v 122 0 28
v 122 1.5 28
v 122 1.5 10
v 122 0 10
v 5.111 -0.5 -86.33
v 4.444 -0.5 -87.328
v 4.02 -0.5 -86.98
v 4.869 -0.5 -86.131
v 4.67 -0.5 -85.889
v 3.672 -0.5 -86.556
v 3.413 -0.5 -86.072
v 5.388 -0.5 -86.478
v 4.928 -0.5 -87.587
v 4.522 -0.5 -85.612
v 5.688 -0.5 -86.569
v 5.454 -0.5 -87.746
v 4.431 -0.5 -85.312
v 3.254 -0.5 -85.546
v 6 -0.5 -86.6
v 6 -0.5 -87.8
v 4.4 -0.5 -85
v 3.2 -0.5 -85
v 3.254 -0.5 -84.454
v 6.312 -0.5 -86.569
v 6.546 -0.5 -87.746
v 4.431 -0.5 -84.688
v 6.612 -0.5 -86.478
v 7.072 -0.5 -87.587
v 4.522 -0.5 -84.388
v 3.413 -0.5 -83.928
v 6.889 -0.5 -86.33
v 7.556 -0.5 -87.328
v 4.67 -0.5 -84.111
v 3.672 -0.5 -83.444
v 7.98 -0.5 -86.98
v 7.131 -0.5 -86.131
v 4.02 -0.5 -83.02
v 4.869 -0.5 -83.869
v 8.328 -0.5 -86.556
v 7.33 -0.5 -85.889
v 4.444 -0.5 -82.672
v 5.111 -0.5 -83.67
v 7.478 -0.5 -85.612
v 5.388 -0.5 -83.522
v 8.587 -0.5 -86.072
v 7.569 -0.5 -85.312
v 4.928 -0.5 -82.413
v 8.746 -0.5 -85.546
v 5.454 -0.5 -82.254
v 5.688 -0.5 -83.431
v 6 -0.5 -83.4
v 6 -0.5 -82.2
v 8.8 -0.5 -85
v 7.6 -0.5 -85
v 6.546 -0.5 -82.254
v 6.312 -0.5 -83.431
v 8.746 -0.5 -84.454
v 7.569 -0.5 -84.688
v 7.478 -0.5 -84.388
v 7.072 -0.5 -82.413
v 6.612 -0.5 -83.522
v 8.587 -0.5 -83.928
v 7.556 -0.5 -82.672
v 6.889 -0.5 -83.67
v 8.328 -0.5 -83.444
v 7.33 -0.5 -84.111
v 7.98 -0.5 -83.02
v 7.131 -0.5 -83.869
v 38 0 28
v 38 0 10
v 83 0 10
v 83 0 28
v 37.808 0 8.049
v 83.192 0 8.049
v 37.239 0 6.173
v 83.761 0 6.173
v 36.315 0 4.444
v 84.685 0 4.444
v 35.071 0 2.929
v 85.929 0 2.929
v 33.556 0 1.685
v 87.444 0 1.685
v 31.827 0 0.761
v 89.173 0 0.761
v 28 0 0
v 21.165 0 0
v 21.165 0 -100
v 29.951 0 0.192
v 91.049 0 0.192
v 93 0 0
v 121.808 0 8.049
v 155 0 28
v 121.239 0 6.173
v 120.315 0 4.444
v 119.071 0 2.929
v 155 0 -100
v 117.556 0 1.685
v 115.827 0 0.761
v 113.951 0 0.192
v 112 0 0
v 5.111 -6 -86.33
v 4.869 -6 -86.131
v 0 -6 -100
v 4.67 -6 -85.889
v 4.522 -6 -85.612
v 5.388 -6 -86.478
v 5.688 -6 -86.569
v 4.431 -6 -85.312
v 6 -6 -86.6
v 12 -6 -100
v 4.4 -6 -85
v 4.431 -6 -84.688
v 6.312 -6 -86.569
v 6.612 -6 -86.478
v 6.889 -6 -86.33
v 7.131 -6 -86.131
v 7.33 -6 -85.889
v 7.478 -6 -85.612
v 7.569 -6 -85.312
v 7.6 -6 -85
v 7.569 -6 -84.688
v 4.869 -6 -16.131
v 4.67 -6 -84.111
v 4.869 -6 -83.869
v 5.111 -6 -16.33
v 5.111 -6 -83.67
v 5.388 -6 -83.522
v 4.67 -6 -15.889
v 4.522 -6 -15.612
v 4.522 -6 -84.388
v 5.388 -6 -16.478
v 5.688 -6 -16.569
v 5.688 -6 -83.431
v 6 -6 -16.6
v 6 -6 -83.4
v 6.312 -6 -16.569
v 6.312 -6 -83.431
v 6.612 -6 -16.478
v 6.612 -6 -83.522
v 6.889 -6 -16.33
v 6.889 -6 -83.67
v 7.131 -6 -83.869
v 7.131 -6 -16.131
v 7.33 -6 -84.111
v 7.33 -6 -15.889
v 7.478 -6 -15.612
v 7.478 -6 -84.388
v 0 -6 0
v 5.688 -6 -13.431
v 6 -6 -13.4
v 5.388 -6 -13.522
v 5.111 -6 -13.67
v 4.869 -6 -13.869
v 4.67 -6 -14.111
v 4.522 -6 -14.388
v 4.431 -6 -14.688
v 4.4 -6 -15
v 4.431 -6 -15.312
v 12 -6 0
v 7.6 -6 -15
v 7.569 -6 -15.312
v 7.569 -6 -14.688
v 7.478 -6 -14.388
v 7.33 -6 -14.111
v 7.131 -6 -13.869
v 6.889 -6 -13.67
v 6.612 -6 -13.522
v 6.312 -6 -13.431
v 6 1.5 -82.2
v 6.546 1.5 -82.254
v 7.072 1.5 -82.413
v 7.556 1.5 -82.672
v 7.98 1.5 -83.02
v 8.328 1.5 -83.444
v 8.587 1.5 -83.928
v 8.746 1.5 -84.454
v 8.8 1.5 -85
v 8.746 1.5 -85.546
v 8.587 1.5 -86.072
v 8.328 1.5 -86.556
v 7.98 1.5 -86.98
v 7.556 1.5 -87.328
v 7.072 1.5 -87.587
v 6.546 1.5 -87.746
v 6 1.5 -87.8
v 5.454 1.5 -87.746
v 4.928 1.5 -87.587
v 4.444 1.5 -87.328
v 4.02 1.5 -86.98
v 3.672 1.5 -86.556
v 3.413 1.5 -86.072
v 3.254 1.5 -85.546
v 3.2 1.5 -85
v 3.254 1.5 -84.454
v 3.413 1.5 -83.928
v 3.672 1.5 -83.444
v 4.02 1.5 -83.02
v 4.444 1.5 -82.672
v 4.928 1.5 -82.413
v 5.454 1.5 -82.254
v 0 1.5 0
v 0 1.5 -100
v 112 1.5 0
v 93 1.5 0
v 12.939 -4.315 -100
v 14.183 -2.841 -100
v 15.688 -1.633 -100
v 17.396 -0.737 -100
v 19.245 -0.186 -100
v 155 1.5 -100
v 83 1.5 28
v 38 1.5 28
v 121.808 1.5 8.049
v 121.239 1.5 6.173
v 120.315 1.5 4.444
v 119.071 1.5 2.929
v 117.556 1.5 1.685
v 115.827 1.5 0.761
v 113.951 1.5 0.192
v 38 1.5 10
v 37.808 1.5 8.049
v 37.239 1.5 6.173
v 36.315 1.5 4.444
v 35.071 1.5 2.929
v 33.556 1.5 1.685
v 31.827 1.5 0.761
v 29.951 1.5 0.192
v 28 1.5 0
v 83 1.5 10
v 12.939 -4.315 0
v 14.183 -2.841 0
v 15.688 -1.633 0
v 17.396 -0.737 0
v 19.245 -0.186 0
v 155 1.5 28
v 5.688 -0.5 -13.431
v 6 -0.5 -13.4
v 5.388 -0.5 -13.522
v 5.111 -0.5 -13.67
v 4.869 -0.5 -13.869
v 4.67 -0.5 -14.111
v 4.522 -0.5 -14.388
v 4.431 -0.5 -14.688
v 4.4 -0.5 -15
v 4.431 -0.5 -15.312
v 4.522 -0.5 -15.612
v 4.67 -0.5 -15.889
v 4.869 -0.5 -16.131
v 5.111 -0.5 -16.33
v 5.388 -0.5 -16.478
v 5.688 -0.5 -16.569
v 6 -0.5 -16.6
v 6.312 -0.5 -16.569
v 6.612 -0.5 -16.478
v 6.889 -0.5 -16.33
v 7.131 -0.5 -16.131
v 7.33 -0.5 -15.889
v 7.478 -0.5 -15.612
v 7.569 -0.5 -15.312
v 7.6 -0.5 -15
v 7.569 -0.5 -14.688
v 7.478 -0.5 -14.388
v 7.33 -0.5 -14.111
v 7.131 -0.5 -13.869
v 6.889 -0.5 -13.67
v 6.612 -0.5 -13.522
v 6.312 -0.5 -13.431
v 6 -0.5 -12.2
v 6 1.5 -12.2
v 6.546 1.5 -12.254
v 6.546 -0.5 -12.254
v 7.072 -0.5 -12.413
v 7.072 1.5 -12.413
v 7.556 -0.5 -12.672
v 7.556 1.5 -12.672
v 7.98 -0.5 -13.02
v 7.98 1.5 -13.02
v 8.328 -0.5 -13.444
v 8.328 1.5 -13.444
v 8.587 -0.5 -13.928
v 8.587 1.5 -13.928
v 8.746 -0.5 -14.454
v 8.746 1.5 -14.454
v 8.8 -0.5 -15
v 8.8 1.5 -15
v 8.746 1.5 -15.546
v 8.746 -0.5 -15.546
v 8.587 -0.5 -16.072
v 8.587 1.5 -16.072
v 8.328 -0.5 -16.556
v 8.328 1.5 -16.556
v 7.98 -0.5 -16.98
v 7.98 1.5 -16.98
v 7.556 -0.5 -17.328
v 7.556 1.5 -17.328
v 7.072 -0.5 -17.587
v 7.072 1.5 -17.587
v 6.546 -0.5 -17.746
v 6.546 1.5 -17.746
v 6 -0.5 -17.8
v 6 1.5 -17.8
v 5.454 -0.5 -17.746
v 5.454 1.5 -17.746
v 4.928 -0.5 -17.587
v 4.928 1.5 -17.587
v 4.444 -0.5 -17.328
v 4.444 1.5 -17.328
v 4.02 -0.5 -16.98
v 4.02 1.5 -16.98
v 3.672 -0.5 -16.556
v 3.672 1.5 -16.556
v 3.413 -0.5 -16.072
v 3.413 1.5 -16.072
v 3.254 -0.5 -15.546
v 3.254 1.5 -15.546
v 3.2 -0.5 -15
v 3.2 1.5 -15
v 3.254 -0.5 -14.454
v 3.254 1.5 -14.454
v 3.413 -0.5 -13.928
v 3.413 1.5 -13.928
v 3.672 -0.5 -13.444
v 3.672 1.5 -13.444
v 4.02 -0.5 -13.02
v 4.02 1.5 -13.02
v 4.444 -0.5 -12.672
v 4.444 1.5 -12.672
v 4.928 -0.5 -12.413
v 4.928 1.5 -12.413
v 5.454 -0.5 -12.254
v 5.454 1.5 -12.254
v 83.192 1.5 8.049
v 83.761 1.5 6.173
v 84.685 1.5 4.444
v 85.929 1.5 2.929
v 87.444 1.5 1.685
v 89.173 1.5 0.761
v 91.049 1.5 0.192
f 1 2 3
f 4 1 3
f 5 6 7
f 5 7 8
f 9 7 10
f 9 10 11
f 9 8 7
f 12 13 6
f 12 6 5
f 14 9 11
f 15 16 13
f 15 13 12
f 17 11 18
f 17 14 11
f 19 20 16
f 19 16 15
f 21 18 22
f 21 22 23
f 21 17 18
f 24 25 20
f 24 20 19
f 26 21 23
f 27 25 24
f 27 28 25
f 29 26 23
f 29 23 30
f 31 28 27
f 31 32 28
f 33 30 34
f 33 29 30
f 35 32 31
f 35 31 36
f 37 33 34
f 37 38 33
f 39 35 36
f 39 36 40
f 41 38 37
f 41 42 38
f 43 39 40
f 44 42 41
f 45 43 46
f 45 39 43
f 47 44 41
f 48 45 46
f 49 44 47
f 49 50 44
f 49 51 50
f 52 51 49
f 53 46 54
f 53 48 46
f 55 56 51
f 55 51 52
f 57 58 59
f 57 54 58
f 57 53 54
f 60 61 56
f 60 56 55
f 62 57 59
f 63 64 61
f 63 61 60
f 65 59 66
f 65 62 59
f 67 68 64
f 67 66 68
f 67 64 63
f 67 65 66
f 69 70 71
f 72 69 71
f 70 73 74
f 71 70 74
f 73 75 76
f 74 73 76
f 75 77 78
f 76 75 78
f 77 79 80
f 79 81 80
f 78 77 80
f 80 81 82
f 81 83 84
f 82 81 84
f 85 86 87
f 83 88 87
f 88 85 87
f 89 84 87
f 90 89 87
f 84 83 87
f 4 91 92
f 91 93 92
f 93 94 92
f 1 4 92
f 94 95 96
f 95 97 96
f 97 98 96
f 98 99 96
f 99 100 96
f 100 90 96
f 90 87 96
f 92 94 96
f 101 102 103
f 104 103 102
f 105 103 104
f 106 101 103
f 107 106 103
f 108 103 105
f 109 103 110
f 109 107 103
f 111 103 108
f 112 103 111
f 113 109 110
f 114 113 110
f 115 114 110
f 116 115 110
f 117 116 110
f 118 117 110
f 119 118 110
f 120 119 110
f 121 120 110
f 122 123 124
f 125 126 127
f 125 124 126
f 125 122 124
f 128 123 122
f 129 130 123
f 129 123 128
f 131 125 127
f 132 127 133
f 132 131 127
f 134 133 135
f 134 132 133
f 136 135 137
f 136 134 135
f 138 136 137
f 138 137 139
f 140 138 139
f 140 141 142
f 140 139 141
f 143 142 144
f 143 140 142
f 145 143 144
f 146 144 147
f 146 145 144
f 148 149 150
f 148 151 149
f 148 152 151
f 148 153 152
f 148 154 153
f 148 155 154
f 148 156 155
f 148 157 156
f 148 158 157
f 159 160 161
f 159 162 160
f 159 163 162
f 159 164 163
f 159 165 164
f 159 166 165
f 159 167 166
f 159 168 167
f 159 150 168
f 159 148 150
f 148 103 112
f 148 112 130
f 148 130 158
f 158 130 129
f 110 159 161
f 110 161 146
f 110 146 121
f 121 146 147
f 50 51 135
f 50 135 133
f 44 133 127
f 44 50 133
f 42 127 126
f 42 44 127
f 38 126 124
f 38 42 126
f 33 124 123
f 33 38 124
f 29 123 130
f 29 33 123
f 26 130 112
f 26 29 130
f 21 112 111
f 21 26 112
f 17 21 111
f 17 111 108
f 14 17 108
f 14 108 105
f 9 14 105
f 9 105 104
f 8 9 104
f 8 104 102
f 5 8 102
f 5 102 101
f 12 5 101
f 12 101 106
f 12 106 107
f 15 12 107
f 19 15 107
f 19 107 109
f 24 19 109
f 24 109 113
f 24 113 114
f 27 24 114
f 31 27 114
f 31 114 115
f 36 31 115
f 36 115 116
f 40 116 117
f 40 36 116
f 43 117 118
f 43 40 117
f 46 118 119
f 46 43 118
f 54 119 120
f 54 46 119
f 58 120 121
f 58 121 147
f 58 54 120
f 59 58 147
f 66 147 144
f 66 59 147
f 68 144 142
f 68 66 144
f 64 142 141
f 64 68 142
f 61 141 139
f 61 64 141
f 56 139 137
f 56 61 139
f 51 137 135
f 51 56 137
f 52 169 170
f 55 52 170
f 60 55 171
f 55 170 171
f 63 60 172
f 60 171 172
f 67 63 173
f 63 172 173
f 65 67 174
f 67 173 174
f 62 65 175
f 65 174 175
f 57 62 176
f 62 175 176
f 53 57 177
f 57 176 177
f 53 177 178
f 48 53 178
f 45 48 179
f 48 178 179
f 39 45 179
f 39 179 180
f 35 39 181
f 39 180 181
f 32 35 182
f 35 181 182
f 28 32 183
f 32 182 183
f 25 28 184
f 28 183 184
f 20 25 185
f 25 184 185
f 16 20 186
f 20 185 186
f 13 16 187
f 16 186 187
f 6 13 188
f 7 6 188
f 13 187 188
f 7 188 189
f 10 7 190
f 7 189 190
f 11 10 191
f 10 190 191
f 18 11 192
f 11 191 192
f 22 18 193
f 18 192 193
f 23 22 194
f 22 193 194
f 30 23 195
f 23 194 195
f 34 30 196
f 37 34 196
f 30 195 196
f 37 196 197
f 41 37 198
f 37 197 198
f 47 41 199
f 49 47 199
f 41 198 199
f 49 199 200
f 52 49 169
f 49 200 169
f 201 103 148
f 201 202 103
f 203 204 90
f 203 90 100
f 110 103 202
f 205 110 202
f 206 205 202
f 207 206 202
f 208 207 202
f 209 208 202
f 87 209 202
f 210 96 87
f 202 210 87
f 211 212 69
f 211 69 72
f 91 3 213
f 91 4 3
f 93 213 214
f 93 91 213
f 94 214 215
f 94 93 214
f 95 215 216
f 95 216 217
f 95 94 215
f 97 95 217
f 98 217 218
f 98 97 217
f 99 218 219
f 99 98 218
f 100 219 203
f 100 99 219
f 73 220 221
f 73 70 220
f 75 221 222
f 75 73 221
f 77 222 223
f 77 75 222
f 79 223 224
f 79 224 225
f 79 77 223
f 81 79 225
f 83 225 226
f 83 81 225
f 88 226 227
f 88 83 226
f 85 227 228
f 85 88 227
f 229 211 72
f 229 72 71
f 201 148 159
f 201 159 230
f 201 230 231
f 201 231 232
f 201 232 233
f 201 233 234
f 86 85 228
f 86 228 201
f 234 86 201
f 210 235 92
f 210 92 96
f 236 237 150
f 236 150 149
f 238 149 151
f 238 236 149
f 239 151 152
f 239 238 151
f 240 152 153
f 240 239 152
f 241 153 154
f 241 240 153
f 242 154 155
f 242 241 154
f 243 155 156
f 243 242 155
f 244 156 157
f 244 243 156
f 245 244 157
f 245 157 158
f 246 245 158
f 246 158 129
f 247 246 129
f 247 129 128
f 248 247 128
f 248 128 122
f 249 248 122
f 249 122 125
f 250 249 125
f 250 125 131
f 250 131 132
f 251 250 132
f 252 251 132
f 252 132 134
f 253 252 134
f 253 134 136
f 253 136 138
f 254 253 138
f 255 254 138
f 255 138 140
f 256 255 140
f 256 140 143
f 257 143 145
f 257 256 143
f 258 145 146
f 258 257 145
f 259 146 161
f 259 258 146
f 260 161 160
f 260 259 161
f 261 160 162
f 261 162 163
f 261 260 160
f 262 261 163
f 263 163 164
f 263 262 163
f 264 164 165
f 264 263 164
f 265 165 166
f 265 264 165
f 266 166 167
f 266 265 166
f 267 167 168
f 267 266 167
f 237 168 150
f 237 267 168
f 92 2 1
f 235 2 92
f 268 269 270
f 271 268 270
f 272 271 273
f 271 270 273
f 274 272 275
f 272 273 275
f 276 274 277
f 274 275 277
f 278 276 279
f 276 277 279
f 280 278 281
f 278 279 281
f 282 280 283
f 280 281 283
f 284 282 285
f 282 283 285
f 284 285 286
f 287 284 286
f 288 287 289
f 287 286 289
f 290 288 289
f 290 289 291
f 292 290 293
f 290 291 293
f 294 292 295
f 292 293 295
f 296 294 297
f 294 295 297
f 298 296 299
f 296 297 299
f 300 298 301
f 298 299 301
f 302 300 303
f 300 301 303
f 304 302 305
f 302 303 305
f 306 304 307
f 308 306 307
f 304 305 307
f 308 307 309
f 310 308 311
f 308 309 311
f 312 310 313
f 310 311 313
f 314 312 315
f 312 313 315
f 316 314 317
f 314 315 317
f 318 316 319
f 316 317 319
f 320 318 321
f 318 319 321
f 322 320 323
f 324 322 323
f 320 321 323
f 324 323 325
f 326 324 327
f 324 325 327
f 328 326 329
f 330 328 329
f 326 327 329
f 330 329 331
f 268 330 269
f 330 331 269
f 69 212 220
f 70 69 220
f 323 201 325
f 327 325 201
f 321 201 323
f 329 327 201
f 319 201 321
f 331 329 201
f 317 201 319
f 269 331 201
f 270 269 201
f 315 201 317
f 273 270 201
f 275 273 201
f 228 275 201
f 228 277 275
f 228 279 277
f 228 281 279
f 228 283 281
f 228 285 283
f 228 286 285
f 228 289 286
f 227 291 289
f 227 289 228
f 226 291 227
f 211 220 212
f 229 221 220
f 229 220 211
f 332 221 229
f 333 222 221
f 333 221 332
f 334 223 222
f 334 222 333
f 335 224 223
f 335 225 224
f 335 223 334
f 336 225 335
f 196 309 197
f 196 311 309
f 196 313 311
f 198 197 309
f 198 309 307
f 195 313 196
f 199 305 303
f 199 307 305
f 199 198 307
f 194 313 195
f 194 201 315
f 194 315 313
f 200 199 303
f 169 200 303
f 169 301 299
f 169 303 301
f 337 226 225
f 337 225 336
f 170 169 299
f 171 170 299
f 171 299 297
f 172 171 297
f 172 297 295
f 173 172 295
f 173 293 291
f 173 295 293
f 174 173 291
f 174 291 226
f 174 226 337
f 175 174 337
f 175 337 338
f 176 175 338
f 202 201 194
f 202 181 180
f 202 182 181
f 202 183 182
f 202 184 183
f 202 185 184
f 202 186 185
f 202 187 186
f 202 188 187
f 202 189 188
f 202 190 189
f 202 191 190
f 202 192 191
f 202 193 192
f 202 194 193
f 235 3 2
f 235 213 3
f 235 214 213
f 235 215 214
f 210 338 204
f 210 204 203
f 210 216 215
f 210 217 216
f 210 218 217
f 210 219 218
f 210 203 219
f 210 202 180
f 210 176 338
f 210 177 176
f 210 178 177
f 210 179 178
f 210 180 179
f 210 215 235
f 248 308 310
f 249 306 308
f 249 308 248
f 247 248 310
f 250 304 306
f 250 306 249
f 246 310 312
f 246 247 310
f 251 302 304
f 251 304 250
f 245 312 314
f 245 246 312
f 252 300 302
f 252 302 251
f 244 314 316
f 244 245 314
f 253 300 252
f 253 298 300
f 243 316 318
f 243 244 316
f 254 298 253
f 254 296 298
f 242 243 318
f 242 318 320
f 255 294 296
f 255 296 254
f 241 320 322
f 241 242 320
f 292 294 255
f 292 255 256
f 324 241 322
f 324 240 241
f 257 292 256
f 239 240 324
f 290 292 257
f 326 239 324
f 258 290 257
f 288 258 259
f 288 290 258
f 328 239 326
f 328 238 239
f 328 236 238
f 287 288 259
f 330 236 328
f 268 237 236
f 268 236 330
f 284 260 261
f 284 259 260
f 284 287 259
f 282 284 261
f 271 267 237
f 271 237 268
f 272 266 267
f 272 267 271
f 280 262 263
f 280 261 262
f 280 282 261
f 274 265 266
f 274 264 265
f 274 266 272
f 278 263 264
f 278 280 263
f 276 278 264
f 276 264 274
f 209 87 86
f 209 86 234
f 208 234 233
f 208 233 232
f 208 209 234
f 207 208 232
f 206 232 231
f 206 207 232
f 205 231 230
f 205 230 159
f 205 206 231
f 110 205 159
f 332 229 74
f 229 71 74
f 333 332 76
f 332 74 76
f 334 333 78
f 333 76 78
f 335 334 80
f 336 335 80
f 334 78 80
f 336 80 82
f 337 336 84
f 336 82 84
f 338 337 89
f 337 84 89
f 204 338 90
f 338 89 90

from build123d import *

# Parameters (mm, degrees)
CROQUIS1_W              = 155
CROQUIS1_H              = 100
SALIENTE_EXTRUIR1_DEPTH = 1.5
CROQUIS2_R              = 1.6
CORTAR_EXTRUIR1_DEPTH   = 1.5
CROQUIS3_W              = 12
CROQUIS3_H              = 100
CROQUIS3_R              = 1.6
SALIENTE_EXTRUIR2_DEPTH = 6
CROQUIS4_W              = 45
CROQUIS4_H              = 28
CROQUIS4_W_2            = 33
SALIENTE_EXTRUIR3_DEPTH = 1.5
REDONDEO1_R             = 10
REDONDEO2_R             = 10
CROQUIS5_R              = 2.8
CORTAR_EXTRUIR2_DEPTH   = 2


with BuildPart() as part:
    # Croquis1 → Saliente-Extruir1 (new body)
    with BuildSketch(Plane(origin=(0, 0, 0), x_dir=(1, 0, 0), z_dir=(0, 1, 0))):
        with Locations((77.5, 50)):
            Rectangle(CROQUIS1_W, CROQUIS1_H)
    extrude(amount=SALIENTE_EXTRUIR1_DEPTH)

    # Croquis2 → Cortar-Extruir1 (cut)
    with BuildSketch(Plane(origin=(0, 1.5, 0), x_dir=(1, 0, 0), z_dir=(0, 1, 0))):
        with Locations(Location((6, 85, 0), (0, 0, 270))):
            Circle(CROQUIS2_R)
        with Locations(Location((6, 15, 0), (0, 0, 270))):
            Circle(CROQUIS2_R)
    extrude(amount=-CORTAR_EXTRUIR1_DEPTH, mode=Mode.SUBTRACT)

    # Croquis3 → Saliente-Extruir2 (add)
    with BuildSketch(Plane.XZ):
        with Locations((6, -50)):
            Rectangle(CROQUIS3_W, CROQUIS3_H)
        with Locations(Location((6, -15, 0), (0, 0, 90))):
            Circle(CROQUIS3_R, mode=Mode.SUBTRACT)
        with Locations(Location((6, -85, 0), (0, 0, 90))):
            Circle(CROQUIS3_R, mode=Mode.SUBTRACT)
    extrude(amount=SALIENTE_EXTRUIR2_DEPTH)

    # Croquis4 → Saliente-Extruir3 (add)
    with BuildSketch(Plane(origin=(0, 1.5, 0), x_dir=(1, 0, 0), z_dir=(0, 1, 0))):
        with Locations((60.5, -14)):
            Rectangle(CROQUIS4_W, CROQUIS4_H)
        with Locations((138.5, -14)):
            Rectangle(CROQUIS4_W_2, CROQUIS4_H)
    extrude(amount=-SALIENTE_EXTRUIR3_DEPTH)

    # Redondeo1
    redondeo1_edges = [part.edges().sort_by_distance(p)[0] for p in [
        (83, 0.75, 0),
        (38, 0.75, 0),
        (122, 0.75, 0),
    ]]
    fillet(redondeo1_edges, radius=REDONDEO1_R)

    # Redondeo2
    # the kernel refuses this fillet: 10 mm, written as the material it adds along each edge
    with BuildSketch(Plane(origin=(12, 0, -100), x_dir=(0, -1, 0), z_dir=(0, 0, 1))) as redondeo2_piece_1:
        with BuildLine():
            CenterArc((10, 9.16515139), REDONDEO2_R, 180, 66.421821522)
            Line((0, 9.16515139), (-0.2, 9.16515139))
            Line((-0.2, 9.16515139), (-0.2, 0))
            Line((-0.2, 0), (0, -0.2))
            ThreePointArc((0, -0.2), (3, -0.2), (5.92, -0.183303028))
            Line((5.92, -0.183303028), (6, 0))
        make_face()
    extrude(amount=100)

    # Croquis5 → Cortar-Extruir2 (cut)
    with BuildSketch(Plane(origin=(0, 1.5, 0), x_dir=(1, 0, 0), z_dir=(0, 1, 0))):
        with Locations(Location((6, 85, 0), (0, 0, 270))):
            Circle(CROQUIS5_R)
        with Locations(Location((6, 15, 0), (0, 0, 270))):
            Circle(CROQUIS5_R)
    extrude(amount=-CORTAR_EXTRUIR2_DEPTH, mode=Mode.SUBTRACT)


solid = part.part
